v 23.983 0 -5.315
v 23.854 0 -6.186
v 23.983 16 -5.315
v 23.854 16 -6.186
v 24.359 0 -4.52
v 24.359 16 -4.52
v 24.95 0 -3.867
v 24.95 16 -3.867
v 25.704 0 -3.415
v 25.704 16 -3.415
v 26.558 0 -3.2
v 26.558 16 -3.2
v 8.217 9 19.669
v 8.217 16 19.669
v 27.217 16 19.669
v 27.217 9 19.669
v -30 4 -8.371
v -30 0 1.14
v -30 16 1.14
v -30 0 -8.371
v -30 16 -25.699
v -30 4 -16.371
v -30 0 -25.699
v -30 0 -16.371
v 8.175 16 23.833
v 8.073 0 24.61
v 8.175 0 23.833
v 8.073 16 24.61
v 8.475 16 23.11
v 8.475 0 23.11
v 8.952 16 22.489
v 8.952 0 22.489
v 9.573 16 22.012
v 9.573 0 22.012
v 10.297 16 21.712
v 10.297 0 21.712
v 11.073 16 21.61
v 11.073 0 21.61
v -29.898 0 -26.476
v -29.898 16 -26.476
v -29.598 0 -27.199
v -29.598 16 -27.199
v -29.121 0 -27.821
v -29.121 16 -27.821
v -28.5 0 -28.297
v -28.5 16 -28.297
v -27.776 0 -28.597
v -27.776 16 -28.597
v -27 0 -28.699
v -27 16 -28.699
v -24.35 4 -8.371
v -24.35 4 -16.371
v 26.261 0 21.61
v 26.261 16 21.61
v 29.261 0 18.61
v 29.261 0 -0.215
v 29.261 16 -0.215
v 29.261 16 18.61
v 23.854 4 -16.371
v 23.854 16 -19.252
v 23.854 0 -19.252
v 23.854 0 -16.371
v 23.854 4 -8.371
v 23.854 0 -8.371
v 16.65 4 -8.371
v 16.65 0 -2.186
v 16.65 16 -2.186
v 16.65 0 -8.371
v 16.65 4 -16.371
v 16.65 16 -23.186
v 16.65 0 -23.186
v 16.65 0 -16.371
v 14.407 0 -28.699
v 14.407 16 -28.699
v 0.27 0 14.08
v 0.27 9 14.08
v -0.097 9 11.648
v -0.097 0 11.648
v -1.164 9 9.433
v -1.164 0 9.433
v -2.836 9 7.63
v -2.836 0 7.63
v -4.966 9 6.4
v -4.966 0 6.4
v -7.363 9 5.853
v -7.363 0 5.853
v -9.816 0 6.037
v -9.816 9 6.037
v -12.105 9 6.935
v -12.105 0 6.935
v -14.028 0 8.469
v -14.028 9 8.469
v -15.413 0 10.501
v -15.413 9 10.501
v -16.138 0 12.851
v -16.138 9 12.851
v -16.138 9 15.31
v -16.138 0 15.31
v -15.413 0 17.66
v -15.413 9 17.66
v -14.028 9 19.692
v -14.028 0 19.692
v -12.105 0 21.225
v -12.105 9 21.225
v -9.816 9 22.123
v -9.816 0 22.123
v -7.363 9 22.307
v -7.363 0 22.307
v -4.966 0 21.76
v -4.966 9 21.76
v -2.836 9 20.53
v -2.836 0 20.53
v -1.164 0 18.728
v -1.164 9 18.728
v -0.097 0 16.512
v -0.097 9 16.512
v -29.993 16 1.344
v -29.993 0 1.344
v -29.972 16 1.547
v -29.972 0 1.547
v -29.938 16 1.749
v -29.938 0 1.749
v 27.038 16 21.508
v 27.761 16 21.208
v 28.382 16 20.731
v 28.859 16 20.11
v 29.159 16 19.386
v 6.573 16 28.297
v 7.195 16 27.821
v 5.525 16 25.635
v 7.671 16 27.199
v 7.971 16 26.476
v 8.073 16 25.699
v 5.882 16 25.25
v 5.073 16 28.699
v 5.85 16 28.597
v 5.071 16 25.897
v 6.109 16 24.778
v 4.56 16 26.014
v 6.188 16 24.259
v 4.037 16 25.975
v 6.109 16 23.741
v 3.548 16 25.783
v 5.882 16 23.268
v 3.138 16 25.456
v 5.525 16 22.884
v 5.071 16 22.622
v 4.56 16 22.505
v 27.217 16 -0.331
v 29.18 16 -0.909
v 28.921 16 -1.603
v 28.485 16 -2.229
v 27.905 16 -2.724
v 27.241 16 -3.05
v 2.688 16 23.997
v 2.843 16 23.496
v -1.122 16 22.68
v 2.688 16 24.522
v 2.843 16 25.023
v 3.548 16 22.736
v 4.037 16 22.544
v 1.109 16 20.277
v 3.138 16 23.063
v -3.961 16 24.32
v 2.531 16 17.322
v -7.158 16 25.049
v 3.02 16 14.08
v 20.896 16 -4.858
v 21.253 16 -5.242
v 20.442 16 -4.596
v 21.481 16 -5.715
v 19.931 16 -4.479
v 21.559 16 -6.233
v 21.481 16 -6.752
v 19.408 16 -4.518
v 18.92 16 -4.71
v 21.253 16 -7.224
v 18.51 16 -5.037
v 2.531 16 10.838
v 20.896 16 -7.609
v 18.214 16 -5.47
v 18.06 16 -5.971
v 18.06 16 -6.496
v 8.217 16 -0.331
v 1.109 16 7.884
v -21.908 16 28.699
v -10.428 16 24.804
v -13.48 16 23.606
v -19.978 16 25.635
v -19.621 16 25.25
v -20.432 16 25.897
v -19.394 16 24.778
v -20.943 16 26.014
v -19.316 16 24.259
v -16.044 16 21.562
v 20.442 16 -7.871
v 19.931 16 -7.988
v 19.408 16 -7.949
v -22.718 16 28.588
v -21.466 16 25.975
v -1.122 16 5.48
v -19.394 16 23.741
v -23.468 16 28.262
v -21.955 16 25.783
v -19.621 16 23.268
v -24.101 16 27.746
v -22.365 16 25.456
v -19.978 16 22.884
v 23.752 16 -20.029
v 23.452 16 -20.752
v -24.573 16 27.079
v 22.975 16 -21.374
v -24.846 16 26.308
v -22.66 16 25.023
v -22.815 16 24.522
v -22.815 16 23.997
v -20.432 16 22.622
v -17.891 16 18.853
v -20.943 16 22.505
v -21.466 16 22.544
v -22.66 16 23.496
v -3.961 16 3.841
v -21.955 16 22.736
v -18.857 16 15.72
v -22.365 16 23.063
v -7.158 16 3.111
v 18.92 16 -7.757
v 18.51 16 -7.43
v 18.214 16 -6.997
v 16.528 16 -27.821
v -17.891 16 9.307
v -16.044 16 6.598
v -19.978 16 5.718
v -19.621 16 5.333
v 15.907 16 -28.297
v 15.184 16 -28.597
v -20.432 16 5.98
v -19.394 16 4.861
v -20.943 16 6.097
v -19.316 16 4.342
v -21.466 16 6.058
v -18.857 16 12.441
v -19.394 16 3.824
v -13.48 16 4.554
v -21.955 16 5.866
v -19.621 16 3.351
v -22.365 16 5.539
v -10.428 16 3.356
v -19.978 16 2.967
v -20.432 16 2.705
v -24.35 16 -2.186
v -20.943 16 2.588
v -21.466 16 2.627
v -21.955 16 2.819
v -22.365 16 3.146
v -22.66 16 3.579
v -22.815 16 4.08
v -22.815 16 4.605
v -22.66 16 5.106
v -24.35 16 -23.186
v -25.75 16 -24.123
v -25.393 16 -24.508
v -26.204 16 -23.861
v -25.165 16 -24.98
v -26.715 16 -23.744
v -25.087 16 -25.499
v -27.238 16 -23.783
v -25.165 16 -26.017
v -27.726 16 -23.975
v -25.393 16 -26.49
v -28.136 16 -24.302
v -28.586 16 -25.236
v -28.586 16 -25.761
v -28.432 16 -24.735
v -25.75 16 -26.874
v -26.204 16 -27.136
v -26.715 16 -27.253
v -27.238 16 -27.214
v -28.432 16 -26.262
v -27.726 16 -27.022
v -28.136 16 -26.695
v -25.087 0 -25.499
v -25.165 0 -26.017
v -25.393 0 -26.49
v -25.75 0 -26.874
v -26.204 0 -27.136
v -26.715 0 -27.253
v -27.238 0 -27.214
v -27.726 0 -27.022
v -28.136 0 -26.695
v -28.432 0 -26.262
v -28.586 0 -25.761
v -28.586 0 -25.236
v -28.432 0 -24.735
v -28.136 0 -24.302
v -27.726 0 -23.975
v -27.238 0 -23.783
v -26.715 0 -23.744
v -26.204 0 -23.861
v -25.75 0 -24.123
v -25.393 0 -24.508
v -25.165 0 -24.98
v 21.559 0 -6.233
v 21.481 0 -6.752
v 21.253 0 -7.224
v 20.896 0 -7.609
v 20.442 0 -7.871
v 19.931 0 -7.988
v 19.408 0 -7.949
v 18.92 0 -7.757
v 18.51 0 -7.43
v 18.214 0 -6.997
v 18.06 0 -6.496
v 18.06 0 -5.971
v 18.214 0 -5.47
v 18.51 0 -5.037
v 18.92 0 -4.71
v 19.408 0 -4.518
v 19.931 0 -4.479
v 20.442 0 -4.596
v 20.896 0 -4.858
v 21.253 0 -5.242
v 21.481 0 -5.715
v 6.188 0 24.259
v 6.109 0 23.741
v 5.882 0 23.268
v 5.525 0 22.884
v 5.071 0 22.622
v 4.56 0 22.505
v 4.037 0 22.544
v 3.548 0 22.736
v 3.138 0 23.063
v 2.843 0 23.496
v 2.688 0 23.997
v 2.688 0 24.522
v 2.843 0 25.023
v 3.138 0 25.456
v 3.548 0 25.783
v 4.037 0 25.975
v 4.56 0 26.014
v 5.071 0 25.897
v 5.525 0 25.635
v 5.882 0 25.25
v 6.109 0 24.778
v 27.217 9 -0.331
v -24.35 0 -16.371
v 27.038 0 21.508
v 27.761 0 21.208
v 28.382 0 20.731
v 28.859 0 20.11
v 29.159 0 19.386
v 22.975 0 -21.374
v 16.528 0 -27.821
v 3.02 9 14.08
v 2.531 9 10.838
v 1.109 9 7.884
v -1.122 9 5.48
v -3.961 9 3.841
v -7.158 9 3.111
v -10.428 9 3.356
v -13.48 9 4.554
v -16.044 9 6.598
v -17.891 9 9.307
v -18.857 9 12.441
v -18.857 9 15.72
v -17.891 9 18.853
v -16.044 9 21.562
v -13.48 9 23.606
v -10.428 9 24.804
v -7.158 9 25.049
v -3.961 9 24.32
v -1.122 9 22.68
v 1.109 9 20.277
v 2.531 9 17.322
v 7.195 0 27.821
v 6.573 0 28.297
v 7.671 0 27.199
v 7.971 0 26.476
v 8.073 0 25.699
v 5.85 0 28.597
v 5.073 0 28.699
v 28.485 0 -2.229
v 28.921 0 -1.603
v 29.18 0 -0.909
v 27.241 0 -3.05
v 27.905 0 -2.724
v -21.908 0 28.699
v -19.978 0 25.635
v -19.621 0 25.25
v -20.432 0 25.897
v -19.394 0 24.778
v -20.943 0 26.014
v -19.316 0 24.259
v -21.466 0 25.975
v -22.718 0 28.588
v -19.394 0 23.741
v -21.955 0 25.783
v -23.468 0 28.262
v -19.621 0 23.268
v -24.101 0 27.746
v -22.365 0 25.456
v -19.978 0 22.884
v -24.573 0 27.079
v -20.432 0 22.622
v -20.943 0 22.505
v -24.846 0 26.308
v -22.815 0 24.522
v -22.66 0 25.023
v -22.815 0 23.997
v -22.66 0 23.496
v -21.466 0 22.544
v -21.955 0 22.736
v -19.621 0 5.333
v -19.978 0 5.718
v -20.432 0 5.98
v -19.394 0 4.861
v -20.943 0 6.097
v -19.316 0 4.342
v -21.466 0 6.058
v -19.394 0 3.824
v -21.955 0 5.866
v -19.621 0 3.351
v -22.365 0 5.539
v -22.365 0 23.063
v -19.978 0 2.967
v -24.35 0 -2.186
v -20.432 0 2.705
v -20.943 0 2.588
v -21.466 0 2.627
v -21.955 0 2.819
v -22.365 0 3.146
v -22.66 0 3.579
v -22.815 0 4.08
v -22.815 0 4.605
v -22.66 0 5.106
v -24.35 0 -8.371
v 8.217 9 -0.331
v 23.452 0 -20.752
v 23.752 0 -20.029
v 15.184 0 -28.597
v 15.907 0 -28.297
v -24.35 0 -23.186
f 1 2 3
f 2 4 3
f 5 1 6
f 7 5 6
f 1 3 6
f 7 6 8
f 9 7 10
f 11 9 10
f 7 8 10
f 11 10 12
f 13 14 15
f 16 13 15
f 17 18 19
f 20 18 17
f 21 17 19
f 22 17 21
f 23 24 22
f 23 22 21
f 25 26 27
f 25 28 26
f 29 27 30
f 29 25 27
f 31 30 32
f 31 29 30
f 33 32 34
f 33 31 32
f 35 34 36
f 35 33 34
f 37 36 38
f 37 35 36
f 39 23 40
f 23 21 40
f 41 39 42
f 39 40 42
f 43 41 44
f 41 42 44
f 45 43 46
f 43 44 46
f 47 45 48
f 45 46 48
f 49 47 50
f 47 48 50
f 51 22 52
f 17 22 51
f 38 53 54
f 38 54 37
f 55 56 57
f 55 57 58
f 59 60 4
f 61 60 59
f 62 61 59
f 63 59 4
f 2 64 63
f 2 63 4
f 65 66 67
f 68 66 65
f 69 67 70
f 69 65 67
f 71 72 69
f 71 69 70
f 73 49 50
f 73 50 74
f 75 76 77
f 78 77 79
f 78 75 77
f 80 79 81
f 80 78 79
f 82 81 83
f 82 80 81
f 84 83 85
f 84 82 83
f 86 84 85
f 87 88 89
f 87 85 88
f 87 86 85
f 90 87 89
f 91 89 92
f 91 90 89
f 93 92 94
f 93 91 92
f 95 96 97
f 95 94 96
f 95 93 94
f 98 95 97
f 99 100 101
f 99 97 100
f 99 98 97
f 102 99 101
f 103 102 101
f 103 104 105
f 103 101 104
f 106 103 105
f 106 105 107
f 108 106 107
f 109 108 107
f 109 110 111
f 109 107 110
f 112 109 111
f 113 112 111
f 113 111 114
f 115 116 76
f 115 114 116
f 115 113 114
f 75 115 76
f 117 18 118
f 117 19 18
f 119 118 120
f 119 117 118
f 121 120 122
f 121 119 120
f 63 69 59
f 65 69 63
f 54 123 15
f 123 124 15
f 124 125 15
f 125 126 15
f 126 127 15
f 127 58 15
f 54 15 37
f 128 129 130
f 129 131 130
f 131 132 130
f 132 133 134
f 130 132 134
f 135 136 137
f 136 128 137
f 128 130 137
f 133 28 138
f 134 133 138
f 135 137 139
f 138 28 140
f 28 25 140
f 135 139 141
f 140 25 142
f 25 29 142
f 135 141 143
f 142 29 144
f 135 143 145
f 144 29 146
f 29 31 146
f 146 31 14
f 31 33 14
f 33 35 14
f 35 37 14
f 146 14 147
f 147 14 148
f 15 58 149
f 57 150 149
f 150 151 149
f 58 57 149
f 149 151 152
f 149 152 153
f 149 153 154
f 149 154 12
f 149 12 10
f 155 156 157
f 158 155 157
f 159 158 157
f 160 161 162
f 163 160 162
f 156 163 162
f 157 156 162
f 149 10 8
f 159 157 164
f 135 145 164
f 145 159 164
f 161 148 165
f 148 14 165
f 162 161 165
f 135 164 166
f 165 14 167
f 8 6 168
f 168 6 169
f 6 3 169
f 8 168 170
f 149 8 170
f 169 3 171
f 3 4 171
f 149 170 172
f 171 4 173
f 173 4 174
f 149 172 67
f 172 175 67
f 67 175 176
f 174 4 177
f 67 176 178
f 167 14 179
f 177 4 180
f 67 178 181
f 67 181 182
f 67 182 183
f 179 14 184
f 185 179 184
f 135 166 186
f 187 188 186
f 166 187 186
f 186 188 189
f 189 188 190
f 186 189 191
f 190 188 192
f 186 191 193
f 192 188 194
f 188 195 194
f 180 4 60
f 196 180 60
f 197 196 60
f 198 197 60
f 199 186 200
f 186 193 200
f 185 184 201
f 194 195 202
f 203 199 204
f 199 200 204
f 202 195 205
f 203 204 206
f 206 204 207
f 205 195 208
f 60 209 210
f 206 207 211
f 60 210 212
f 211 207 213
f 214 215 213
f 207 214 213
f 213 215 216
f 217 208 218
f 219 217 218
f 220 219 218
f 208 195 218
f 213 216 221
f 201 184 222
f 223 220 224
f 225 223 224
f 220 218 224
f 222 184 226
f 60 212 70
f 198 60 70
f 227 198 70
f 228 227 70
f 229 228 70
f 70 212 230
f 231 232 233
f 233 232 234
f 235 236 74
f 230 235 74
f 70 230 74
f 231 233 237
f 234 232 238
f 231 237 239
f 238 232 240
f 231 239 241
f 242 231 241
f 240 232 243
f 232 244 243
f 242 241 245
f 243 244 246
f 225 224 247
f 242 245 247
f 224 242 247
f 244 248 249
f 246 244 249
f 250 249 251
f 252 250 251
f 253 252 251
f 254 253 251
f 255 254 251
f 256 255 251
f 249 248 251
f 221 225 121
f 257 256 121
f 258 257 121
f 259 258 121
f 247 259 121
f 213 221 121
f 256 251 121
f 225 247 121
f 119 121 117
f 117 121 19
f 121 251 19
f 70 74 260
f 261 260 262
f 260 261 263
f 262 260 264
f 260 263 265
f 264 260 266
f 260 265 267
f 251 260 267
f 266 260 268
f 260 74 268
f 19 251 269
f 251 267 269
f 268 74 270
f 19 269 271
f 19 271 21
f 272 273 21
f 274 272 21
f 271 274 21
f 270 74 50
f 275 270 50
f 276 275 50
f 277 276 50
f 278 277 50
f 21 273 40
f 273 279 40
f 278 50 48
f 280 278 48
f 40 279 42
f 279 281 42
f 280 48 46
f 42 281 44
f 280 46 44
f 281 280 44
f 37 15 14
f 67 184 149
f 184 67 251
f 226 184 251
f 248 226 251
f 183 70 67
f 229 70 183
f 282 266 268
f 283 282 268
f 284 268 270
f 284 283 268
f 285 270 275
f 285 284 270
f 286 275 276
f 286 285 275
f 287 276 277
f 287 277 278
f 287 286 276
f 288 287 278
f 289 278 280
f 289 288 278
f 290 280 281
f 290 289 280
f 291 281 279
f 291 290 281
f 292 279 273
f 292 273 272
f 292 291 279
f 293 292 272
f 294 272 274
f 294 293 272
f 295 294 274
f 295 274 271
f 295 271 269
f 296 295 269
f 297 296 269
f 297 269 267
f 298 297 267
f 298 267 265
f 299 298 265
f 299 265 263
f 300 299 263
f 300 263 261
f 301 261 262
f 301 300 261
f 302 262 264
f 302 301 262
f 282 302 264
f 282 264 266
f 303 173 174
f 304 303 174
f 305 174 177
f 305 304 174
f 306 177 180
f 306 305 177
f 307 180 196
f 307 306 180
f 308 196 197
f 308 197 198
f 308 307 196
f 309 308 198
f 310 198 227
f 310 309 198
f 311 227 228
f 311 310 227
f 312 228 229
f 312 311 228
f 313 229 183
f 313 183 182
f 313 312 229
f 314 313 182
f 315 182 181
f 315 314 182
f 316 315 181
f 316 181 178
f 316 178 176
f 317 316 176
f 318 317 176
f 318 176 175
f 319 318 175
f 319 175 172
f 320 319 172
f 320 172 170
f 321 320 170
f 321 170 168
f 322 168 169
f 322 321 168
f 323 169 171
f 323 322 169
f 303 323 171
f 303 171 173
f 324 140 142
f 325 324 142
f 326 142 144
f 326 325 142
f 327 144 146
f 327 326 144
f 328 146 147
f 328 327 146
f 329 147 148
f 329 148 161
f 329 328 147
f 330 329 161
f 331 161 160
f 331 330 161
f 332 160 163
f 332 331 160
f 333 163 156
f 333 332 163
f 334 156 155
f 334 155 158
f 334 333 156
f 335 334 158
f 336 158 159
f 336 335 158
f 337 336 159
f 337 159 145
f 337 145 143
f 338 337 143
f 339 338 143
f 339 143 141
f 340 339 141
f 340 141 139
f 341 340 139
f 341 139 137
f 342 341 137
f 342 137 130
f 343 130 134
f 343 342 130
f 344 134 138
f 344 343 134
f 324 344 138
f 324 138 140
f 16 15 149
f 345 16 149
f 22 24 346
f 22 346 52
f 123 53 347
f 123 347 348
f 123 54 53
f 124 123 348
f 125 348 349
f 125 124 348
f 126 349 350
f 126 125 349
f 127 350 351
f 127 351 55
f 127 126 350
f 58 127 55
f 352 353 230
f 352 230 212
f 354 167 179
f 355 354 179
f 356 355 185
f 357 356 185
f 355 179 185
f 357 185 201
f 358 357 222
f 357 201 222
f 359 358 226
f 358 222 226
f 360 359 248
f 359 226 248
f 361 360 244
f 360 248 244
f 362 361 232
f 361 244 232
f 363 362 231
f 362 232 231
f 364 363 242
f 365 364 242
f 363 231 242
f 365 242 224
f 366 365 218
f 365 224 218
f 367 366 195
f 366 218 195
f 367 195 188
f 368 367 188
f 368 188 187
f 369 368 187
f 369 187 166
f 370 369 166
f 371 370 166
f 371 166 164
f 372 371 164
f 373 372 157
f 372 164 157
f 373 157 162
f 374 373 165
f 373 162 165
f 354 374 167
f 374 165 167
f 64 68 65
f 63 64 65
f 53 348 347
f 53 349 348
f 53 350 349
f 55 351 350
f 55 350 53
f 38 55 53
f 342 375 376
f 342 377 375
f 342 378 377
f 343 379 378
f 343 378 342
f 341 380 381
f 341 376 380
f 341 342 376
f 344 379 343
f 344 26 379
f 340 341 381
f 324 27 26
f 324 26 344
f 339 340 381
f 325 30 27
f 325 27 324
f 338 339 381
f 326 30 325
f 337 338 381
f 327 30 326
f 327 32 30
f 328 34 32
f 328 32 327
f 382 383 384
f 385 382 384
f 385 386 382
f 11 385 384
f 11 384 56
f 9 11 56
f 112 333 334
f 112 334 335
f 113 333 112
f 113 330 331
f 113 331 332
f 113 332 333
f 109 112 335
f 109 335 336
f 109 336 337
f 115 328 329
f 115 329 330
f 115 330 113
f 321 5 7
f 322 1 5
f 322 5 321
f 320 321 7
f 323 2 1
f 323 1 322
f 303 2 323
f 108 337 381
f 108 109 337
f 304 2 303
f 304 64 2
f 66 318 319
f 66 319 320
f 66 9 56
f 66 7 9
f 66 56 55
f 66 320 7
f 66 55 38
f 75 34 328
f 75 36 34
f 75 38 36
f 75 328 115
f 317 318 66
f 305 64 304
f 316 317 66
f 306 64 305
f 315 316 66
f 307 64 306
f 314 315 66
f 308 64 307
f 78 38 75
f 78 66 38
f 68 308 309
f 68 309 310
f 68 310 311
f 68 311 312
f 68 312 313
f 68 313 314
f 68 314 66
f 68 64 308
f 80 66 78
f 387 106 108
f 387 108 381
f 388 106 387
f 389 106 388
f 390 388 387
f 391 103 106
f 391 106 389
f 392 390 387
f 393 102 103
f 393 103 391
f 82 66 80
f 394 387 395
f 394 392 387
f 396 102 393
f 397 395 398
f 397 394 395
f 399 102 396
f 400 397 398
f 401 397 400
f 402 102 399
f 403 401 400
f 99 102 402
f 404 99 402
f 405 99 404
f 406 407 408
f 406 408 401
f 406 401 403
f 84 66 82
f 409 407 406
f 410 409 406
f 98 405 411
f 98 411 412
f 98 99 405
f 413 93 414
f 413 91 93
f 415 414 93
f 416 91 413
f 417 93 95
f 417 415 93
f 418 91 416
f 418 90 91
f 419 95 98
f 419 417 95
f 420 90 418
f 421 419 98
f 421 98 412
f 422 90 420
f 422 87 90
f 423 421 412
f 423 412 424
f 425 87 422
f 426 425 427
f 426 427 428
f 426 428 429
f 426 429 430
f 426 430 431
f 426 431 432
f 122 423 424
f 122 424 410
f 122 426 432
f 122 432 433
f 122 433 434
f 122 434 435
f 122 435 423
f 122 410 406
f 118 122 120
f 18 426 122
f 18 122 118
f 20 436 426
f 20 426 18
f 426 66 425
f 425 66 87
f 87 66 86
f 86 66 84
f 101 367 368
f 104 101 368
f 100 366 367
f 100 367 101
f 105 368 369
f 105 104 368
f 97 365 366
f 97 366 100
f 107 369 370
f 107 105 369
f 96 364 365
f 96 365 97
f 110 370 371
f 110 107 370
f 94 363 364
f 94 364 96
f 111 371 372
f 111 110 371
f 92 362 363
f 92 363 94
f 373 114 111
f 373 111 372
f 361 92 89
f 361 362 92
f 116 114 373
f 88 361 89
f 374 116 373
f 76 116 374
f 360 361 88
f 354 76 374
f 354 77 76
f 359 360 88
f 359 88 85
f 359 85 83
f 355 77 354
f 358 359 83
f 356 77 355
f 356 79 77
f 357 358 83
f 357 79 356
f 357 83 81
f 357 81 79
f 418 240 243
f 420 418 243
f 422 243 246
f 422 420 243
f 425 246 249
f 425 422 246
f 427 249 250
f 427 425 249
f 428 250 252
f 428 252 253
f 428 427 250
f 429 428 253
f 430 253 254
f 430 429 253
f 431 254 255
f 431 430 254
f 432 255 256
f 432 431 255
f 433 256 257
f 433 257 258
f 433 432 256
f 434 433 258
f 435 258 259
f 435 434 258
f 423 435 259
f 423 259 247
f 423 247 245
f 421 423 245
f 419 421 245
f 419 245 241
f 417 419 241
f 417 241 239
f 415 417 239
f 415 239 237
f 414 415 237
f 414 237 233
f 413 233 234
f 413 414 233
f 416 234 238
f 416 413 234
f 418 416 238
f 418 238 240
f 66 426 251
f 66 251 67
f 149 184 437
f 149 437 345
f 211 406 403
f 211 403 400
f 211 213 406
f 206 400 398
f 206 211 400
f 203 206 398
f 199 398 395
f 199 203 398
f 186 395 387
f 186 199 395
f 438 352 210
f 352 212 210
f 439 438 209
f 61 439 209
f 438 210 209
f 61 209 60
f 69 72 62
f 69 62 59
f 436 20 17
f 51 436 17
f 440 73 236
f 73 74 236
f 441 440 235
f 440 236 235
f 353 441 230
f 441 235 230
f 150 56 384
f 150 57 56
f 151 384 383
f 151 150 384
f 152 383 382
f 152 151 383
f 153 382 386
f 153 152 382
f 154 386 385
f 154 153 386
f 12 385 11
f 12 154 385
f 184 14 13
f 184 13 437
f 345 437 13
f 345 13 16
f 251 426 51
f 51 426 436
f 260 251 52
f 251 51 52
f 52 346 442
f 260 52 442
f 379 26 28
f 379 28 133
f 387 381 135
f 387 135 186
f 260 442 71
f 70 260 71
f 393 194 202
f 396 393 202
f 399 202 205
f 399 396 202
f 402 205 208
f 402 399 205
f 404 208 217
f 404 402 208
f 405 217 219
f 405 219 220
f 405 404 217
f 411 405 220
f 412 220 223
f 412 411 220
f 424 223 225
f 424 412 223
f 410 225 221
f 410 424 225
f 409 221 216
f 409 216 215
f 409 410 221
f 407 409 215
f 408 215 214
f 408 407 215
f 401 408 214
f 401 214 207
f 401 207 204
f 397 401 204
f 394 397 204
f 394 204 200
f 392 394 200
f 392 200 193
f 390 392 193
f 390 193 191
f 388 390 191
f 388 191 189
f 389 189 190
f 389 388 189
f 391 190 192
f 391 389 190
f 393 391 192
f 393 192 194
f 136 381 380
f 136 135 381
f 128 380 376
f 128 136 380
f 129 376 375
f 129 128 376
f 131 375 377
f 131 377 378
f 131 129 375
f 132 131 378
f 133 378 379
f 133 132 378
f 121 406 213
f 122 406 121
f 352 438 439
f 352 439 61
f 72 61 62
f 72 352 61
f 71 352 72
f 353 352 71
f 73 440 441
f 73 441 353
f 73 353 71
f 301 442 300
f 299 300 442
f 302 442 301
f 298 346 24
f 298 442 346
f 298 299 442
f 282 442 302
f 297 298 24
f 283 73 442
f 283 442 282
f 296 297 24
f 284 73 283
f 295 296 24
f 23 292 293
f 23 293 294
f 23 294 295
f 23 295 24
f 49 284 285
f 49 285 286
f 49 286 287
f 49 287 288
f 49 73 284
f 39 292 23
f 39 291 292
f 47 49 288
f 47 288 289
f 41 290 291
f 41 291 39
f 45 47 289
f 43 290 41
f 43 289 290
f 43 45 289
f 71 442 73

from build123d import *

# Parameters (mm, degrees)
ESBO_O1_R                = 8.25
ESBO_O1_R_2              = 1.759398981
ESBO_O1_W                = 41
ESBO_O1_H                = 21
RESSALTO_EXTRUS_O1_DEPTH = 16
ESBO_O2_R                = 11
ESBO_O2_W                = 19
ESBO_O2_H                = 20
CORTE_EXTRUS_O1_DEPTH    = 7
FILETE2_R                = 3
FILETE3_R                = 3
ESBO_O4_W                = 8
ESBO_O4_H                = 4
CORTE_EXTRUS_O2_DEPTH    = 60


with BuildPart() as part:
    # Esboço1 → Ressalto-extrusão1 (new body)
    with BuildSketch(Plane(origin=(0, 0, 0), x_dir=(1, 0, 0), z_dir=(0, 1, 0))):
        Polygon((-30, -1.447454982), (-30, 28.699395637), (15.649759457, 28.699395637), (23.854058099, 20.495096994), (23.854058099, 3.185553214), (29.26109124, 3.185553214), (29.26109124, -21.609914281), (8.073270411, -21.609914281), (8.073270411, -28.699395637), (-24.350240543, -28.699395637), align=None)
        with Locations((-7.979986437, -14.080173672)):
            Circle(ESBO_O1_R, mode=Mode.SUBTRACT)
        with Locations((-26.846540224, 25.498704653)):
            Circle(ESBO_O1_R_2, mode=Mode.SUBTRACT)
        with Locations((19.799323859, 6.233376584)):
            Circle(ESBO_O1_R_2, mode=Mode.SUBTRACT)
        with Locations((-21.074944534, -24.259345494)):
            Circle(ESBO_O1_R_2, mode=Mode.SUBTRACT)
        with Locations((4.428183177, -24.259345494)):
            Circle(ESBO_O1_R_2, mode=Mode.SUBTRACT)
        with Locations((-21.074944534, -4.342364945)):
            Circle(ESBO_O1_R_2, mode=Mode.SUBTRACT)
        with Locations((-3.850240543, 12.685553214)):
            Rectangle(ESBO_O1_W, ESBO_O1_H, mode=Mode.SUBTRACT)
    extrude(amount=RESSALTO_EXTRUS_O1_DEPTH)

    # Esboço2 → Corte-extrusão1 (cut)
    with BuildSketch(Plane(origin=(0, 16, 0), x_dir=(1, 0, 0), z_dir=(0, 1, 0))):
        with Locations((-7.979986437, -14.080173672)):
            Circle(ESBO_O2_R)
        with Locations((17.716848977, -9.668999278)):
            Rectangle(ESBO_O2_W, ESBO_O2_H)
    extrude(amount=-CORTE_EXTRUS_O1_DEPTH, mode=Mode.SUBTRACT)

    # Filete2
    filete2_edges = [part.edges().sort_by_distance(p)[0] for p in [
        (-30, 8, 1.447454982),
        (-30, 8, -28.699395637),
        (15.649759457, 8, -28.699395637),
        (23.854058099, 8, -20.495096994),
        (23.854058099, 8, -3.185553214),
        (8.073270411, 8, 28.699395637),
        (-24.350240543, 8, 28.699395637),
    ]]
    fillet(filete2_edges, radius=FILETE2_R)

    # Filete3
    filete3_edges = [part.edges().sort_by_distance(p)[0] for p in [
        (29.26109124, 8, -3.185553214),
        (8.073270411, 8, 21.609914281),
        (29.26109124, 8, 21.609914281),
    ]]
    fillet(filete3_edges, radius=FILETE3_R)

    # Esboço4 → Corte-extrusão2 (cut)
    with BuildSketch(Plane.ZY.offset(30)):
        with Locations((-12.370867745, 2)):
            Rectangle(ESBO_O4_W, ESBO_O4_H)
    extrude(amount=-CORTE_EXTRUS_O2_DEPTH, mode=Mode.SUBTRACT)


solid = part.part
